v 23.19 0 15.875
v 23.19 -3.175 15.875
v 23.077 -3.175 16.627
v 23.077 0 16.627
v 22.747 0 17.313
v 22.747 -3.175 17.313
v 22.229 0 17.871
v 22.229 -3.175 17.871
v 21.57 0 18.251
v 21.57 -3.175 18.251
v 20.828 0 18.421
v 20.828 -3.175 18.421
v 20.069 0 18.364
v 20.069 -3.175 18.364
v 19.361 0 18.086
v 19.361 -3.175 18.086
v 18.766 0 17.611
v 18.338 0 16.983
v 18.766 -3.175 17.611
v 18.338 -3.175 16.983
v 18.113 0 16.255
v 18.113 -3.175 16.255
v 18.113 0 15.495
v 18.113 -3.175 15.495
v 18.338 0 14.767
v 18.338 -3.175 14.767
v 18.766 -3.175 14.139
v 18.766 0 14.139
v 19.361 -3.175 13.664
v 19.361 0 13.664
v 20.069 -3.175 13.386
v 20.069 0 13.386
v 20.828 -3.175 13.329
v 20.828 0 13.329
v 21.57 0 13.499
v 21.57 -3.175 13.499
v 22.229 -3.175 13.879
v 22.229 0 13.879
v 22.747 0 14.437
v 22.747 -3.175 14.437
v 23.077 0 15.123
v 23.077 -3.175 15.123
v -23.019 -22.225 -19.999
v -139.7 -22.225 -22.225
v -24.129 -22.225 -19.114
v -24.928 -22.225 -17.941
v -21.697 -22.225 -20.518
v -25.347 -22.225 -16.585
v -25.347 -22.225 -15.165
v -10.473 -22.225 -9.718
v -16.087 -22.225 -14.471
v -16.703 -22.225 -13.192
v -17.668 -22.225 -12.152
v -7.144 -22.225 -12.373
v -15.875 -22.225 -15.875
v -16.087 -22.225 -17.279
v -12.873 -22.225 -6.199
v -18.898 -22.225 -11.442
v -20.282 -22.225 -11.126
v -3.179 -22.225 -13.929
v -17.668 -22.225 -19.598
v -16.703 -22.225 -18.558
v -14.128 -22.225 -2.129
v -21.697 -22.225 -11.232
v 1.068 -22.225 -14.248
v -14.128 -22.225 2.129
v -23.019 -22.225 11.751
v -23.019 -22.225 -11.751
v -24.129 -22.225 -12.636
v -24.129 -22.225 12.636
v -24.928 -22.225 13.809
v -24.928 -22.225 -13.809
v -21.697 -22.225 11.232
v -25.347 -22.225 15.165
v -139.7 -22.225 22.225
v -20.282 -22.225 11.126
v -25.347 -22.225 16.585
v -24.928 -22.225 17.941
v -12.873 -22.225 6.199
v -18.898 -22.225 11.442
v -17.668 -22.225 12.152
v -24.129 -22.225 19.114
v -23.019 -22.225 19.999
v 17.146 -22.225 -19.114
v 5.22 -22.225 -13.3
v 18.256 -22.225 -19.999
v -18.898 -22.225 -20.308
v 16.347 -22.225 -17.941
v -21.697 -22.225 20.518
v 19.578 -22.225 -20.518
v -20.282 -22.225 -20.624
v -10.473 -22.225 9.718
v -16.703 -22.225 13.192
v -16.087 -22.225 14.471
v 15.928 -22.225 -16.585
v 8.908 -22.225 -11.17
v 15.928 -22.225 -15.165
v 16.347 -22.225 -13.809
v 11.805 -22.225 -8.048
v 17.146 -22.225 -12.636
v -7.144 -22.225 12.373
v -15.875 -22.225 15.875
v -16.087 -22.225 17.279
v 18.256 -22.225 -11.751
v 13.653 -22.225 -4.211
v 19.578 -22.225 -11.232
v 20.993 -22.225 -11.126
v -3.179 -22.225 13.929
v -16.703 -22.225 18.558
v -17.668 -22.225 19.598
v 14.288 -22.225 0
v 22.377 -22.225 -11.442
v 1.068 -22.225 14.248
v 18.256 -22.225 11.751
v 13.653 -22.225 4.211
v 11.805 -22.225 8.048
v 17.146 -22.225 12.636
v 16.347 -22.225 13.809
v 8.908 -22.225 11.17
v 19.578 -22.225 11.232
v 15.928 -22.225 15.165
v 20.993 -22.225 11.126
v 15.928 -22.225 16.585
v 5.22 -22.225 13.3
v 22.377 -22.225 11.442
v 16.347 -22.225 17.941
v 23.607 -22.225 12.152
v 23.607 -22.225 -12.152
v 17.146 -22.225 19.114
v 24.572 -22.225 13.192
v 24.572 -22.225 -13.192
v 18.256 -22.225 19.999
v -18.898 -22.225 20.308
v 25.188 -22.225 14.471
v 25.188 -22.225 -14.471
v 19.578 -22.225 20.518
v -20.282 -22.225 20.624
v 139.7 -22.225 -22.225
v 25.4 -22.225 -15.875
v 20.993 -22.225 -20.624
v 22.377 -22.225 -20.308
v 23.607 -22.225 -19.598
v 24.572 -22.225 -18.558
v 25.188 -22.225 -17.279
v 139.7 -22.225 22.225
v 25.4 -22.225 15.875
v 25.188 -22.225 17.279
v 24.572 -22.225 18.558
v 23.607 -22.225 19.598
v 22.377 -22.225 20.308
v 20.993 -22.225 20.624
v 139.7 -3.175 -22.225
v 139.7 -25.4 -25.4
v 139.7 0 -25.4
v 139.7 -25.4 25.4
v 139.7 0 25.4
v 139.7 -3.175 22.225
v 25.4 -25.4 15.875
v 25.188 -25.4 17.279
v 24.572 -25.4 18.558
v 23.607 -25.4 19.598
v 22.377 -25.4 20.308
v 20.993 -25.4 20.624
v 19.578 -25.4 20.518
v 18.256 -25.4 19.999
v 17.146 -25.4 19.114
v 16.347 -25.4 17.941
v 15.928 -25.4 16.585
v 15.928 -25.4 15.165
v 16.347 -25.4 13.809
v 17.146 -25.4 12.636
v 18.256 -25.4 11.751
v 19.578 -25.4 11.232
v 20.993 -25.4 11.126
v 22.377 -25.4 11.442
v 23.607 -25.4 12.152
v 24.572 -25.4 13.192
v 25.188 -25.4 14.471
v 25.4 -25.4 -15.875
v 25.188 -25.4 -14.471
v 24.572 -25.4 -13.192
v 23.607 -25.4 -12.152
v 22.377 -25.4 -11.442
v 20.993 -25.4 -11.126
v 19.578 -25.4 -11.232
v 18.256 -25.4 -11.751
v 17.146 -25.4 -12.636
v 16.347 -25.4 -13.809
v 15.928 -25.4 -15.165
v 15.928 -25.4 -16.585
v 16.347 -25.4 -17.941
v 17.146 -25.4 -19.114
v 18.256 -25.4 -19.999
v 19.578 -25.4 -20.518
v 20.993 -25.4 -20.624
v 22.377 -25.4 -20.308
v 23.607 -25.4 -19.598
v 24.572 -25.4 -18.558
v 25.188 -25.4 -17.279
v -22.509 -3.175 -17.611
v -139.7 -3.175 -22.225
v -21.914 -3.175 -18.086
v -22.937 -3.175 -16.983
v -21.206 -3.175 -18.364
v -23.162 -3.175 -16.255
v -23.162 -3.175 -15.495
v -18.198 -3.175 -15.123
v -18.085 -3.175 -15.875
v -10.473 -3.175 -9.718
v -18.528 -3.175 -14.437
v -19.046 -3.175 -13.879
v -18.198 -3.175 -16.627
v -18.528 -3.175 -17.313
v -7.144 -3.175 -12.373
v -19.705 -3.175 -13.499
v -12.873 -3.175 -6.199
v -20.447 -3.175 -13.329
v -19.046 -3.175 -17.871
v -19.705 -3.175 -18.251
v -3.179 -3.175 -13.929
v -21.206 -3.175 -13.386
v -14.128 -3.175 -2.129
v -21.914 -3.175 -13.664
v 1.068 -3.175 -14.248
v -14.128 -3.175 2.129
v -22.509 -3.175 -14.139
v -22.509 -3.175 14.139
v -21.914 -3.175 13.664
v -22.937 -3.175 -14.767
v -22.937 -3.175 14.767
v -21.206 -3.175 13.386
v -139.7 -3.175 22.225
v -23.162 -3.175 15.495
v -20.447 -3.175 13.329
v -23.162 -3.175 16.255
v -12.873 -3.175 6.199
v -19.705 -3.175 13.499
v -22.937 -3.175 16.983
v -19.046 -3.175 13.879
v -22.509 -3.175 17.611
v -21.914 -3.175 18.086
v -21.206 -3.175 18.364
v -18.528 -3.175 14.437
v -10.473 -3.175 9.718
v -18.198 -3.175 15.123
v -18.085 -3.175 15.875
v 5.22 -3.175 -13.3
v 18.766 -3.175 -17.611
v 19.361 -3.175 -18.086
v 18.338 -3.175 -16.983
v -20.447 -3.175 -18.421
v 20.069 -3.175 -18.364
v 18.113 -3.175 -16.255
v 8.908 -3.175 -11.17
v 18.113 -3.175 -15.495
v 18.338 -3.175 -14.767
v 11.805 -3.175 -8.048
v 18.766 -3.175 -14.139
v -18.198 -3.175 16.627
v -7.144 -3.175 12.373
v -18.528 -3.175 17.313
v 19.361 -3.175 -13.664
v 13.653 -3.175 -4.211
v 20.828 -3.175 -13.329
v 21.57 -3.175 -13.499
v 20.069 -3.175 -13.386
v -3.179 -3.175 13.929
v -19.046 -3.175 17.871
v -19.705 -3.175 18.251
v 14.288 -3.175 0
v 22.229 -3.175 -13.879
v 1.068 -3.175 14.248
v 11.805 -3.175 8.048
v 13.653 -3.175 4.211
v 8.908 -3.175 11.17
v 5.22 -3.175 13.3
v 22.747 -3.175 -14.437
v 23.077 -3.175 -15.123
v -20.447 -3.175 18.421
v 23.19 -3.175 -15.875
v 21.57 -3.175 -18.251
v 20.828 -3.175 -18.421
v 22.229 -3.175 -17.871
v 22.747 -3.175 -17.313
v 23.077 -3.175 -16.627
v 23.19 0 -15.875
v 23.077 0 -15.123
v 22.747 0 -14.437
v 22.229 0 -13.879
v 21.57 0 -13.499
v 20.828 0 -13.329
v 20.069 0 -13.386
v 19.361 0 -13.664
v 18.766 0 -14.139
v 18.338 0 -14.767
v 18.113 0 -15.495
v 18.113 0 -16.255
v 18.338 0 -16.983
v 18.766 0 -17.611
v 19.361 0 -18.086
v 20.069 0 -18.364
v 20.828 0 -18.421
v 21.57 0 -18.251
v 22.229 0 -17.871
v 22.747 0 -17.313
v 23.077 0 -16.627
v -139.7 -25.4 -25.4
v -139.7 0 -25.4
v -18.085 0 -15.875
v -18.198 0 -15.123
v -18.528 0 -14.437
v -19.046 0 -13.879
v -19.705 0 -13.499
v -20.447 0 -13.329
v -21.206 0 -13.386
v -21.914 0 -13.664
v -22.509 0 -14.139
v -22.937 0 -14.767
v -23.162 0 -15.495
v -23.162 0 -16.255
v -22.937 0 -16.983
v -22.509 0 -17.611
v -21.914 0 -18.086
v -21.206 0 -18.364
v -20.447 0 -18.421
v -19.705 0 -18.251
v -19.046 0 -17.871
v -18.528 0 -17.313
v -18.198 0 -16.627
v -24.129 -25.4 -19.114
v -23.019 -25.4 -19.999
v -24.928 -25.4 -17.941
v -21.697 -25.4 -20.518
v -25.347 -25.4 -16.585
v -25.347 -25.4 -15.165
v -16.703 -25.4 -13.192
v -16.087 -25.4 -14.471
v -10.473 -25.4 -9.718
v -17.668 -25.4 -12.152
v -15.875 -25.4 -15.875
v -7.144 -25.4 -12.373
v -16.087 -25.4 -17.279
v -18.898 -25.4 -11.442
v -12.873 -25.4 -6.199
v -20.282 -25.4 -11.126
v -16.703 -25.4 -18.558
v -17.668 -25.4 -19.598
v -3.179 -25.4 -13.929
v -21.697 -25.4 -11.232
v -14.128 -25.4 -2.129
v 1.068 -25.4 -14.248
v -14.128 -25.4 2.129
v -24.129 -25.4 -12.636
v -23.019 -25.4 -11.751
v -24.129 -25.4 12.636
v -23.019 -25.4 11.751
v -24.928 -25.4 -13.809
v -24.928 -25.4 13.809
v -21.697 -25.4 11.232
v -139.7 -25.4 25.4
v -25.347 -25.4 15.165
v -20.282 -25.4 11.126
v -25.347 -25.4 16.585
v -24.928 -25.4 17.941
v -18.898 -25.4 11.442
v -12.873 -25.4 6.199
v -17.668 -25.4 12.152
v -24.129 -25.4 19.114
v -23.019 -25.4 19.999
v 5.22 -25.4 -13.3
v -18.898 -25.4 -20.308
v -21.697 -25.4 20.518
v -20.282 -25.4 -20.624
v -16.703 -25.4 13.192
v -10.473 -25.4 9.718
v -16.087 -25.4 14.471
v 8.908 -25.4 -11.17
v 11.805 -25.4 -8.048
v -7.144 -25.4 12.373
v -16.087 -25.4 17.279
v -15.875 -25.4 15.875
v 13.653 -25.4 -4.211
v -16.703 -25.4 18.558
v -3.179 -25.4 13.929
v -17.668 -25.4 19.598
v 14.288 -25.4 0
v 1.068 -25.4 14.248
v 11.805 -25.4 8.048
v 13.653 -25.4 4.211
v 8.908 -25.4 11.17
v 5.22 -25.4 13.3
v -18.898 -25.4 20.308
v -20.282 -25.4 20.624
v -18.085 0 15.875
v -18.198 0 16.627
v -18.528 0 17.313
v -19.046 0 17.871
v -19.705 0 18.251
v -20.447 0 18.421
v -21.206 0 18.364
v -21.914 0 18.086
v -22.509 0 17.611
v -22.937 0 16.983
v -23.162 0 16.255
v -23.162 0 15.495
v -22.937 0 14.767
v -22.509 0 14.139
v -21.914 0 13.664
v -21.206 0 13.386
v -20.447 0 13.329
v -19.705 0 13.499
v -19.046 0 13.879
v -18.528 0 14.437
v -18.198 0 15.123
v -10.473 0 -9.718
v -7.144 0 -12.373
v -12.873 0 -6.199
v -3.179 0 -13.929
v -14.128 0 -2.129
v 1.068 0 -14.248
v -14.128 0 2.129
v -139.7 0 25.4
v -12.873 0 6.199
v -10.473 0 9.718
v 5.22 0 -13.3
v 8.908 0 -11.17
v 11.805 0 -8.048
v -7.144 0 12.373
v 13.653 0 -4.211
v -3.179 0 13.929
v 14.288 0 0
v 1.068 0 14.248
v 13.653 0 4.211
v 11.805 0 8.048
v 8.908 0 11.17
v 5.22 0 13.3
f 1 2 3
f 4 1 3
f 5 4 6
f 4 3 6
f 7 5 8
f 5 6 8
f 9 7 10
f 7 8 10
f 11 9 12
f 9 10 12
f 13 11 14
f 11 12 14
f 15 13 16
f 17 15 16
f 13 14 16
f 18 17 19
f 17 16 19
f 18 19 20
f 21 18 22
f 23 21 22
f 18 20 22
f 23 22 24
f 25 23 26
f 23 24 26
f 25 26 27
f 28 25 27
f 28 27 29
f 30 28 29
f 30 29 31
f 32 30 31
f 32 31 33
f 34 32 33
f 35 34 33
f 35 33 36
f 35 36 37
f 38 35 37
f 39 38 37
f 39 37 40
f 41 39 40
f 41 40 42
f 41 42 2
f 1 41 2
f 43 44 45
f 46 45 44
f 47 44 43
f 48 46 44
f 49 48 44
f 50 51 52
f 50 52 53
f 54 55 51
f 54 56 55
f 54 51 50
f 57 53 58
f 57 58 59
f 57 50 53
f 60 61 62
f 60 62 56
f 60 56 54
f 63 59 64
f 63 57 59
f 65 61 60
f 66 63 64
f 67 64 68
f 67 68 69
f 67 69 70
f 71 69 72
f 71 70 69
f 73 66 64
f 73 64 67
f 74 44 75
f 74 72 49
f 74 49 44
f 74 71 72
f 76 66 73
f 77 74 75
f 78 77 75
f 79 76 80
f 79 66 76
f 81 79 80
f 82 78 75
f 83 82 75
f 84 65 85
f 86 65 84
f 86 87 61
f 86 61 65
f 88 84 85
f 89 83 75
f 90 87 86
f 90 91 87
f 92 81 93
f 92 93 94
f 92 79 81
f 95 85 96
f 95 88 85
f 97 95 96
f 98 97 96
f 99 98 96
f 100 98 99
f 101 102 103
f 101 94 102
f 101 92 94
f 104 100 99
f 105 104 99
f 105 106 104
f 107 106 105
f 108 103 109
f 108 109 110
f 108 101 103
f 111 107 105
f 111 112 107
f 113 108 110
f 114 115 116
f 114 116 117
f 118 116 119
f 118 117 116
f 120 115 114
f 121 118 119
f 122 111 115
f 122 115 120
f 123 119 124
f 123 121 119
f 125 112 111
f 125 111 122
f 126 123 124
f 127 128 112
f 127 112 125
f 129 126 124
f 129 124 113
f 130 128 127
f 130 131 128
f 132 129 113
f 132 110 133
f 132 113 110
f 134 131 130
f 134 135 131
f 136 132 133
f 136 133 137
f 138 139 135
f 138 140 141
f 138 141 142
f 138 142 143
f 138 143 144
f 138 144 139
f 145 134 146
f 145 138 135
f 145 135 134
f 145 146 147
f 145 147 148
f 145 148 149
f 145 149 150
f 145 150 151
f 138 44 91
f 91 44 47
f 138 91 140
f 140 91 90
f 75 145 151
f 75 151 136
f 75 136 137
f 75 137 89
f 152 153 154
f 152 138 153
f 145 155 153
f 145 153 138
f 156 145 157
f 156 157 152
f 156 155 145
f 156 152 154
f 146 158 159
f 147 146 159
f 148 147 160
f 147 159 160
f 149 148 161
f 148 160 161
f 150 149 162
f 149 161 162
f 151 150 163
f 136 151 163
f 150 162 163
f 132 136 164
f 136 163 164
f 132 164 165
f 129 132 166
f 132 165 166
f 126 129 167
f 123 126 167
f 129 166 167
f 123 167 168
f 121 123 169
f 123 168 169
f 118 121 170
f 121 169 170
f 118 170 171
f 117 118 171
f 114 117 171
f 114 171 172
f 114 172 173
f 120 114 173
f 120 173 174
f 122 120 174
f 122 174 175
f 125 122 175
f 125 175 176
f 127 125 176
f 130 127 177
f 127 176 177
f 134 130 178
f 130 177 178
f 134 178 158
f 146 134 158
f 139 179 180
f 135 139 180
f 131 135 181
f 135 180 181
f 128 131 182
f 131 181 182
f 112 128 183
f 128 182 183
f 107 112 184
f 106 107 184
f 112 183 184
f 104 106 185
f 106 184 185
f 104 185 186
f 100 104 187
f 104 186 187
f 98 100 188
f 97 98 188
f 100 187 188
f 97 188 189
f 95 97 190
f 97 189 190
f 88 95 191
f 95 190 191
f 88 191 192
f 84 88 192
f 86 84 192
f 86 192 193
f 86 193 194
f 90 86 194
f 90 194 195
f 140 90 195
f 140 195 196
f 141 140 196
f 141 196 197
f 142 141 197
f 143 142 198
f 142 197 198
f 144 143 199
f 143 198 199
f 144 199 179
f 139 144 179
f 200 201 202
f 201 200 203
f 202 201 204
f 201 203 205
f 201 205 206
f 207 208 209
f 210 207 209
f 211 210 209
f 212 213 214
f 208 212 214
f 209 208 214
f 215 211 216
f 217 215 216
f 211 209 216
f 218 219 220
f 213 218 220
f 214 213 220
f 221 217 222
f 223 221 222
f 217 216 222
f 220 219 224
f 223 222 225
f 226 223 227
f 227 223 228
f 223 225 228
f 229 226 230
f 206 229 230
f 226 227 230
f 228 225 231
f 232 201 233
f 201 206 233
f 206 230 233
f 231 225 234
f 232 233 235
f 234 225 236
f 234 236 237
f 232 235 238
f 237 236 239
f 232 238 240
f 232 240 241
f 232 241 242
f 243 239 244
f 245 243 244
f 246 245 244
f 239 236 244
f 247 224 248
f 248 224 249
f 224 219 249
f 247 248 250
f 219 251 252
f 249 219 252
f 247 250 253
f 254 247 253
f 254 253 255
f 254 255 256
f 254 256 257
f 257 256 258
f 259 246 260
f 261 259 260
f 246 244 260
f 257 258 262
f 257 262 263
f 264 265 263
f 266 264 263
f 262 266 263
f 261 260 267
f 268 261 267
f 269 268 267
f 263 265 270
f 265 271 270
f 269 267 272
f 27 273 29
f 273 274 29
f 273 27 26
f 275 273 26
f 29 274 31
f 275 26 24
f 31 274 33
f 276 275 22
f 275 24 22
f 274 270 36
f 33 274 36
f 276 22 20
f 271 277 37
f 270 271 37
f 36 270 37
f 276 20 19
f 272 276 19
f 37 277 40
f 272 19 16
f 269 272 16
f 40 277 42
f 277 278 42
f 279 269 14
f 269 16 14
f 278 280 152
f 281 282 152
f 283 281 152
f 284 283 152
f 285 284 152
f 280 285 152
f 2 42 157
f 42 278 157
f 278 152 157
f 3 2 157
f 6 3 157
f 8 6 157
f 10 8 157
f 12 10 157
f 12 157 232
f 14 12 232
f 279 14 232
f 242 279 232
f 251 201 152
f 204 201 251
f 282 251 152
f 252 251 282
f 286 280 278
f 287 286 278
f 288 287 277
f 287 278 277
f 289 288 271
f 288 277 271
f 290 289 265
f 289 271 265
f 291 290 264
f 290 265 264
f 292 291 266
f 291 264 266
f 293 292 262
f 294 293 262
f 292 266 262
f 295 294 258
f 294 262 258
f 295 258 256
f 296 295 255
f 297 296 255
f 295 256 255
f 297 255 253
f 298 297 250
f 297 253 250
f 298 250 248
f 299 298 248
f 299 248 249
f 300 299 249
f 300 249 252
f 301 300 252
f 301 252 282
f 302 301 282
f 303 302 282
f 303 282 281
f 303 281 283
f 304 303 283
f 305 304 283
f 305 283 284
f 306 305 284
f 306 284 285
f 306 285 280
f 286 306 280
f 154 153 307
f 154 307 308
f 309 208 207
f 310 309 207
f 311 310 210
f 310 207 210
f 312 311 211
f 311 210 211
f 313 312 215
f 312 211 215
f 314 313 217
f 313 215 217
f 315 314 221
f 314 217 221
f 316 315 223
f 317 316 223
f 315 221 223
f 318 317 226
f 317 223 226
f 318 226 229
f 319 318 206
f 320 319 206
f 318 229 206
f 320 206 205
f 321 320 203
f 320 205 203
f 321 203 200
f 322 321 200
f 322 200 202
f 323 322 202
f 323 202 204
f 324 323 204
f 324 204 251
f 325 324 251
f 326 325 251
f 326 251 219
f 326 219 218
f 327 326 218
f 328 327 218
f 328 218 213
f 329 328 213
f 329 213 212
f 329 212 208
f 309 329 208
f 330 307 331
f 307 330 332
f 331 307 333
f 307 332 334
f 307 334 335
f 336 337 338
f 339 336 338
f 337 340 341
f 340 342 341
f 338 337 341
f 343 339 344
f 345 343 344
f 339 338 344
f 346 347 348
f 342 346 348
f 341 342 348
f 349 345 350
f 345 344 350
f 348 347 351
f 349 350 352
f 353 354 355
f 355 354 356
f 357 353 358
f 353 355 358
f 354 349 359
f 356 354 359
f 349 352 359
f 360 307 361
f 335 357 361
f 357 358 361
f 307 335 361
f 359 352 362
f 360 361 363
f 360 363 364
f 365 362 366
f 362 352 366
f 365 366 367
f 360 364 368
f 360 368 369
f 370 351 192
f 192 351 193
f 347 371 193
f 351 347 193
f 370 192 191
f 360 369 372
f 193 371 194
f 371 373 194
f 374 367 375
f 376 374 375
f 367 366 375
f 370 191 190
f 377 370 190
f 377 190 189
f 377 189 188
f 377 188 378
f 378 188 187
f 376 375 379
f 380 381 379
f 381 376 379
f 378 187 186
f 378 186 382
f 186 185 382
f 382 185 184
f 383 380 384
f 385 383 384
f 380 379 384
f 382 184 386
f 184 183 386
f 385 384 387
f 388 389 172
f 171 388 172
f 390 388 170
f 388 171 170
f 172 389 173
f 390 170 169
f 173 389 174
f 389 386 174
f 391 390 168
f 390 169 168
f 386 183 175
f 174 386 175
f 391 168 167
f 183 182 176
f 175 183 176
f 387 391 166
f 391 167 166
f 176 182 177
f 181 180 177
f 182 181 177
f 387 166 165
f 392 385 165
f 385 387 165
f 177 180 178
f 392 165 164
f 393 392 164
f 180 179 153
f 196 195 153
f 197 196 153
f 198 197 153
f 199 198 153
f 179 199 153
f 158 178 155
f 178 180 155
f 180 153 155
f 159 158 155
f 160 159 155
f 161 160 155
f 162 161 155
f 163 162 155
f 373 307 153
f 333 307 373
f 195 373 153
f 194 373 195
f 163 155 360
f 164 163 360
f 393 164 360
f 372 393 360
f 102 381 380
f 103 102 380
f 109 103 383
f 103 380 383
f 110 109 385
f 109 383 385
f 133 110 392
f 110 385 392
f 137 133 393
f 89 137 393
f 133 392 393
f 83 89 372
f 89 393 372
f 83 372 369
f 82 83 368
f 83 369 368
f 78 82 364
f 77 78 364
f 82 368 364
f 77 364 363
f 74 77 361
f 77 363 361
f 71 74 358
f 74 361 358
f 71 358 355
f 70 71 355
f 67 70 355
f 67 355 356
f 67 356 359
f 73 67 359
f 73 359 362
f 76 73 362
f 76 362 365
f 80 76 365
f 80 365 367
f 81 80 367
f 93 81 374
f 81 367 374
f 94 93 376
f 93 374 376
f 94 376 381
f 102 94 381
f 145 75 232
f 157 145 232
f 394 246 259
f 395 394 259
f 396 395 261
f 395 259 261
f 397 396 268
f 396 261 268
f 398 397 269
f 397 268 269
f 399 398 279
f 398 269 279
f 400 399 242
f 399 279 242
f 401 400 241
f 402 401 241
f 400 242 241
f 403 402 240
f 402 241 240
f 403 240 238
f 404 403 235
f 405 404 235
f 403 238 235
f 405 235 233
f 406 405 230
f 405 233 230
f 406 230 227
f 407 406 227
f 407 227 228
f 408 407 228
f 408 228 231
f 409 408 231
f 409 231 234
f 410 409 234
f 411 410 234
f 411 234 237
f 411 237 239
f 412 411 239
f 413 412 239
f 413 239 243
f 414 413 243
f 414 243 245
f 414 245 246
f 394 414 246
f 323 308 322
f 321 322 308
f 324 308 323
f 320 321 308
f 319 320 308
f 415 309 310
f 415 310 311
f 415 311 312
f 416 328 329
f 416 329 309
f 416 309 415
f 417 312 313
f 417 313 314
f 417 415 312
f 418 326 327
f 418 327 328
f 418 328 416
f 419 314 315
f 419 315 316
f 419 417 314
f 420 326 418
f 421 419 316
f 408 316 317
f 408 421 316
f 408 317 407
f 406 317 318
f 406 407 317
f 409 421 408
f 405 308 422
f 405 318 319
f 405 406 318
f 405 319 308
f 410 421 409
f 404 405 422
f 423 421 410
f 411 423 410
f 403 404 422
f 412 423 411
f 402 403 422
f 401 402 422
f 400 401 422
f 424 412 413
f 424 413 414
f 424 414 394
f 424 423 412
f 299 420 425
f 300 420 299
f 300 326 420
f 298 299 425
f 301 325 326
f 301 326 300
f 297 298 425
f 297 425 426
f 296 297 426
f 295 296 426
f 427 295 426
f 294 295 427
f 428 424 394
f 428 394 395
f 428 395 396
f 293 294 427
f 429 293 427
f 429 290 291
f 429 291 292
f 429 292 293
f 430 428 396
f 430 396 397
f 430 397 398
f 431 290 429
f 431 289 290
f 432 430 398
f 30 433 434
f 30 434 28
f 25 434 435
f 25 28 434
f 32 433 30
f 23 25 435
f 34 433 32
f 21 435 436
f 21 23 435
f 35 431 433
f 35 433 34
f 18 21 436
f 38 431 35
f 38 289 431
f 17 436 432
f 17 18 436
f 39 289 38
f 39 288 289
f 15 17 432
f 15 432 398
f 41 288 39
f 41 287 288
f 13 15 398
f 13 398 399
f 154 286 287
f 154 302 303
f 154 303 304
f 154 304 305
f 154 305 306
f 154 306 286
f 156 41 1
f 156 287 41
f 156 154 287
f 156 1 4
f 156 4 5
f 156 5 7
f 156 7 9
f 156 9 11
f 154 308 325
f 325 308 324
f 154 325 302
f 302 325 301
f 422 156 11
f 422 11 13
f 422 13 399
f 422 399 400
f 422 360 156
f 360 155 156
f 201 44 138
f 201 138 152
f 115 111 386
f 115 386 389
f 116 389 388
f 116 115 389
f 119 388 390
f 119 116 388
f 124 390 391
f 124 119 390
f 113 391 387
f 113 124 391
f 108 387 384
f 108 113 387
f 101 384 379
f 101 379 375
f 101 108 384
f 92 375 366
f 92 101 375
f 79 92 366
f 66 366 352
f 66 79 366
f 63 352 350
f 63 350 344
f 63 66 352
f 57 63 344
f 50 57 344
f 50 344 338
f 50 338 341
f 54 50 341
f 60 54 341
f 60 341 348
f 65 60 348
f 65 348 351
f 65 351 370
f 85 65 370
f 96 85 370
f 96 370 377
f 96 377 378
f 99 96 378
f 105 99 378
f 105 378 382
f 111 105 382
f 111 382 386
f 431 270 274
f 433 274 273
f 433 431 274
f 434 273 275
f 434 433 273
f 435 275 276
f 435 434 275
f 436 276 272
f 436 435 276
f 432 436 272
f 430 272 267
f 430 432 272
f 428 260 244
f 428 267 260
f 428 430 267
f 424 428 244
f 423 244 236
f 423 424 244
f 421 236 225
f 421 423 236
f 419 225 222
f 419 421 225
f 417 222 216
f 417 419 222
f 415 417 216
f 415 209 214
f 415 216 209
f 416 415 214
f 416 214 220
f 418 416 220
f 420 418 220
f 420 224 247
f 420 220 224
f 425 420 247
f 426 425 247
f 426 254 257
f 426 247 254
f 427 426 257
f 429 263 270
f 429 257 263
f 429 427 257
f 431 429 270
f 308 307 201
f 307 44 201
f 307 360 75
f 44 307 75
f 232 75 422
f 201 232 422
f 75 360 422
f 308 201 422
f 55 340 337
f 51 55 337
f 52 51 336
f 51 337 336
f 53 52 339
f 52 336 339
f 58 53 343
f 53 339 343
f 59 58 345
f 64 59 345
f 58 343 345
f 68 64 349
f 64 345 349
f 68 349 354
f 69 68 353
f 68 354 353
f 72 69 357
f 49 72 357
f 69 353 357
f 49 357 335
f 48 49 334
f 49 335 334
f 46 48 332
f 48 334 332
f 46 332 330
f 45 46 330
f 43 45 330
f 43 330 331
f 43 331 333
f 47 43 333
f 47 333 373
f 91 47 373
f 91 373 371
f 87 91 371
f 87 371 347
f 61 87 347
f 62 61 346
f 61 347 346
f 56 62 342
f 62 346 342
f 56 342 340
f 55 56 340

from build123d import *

# Parameters (mm, degrees)
F0_W          = 25.4
F0_H          = 50.8
F0_W_2        = 19.05
F0_H_2        = 44.45
F1_DEPTH      = 139.7
F1_DEPTH_BACK = 139.7
F2_R          = 14.2875
F3_DEPTH      = 25.4
F4_R          = 2.5527
F5_DEPTH      = 25.4
F6_R          = 4.7625
F7_DEPTH      = 3.175


with BuildPart() as f1:
    # F0 (on Right) → F1 (new body, two sides)
    with BuildSketch(Plane.YZ) as f1_sk:
        with Locations((-12.7, 0)):
            Rectangle(F0_W, F0_H)
        with Locations((-12.7, 0)):
            Rectangle(F0_W_2, F0_H_2, mode=Mode.SUBTRACT)
    extrude(amount=F1_DEPTH)
    extrude(f1_sk.sketch, amount=-F1_DEPTH_BACK)

    # F2 (on Front) → F3 (cut)
    with BuildSketch(Plane.XZ):
        Circle(F2_R)
    extrude(amount=F3_DEPTH, mode=Mode.SUBTRACT)

    # F4 (on face) → F5 (cut)
    with BuildSketch(Plane.XZ.offset(25.4)):
        with Locations((20.6375, -15.875)):
            Circle(F4_R)
        with Locations((20.6375, 15.875)):
            Circle(F4_R)
        with Locations((-20.6375, 15.875)):
            Circle(F4_R)
        with Locations((-20.6375, -15.875)):
            Circle(F4_R)
    extrude(amount=-F5_DEPTH, mode=Mode.SUBTRACT)

    # F6 (on face) → F7 (cut)
    with BuildSketch(Plane.XZ.offset(25.4)):
        with Locations((20.6375, 15.875)):
            Circle(F6_R)
        with Locations((20.6375, -15.875)):
            Circle(F6_R)
        with Locations((-20.6375, -15.875)):
            Circle(F6_R)
        with Locations((-20.6375, 15.875)):
            Circle(F6_R)
    extrude(amount=-F7_DEPTH, mode=Mode.SUBTRACT)


solid = f1.part
